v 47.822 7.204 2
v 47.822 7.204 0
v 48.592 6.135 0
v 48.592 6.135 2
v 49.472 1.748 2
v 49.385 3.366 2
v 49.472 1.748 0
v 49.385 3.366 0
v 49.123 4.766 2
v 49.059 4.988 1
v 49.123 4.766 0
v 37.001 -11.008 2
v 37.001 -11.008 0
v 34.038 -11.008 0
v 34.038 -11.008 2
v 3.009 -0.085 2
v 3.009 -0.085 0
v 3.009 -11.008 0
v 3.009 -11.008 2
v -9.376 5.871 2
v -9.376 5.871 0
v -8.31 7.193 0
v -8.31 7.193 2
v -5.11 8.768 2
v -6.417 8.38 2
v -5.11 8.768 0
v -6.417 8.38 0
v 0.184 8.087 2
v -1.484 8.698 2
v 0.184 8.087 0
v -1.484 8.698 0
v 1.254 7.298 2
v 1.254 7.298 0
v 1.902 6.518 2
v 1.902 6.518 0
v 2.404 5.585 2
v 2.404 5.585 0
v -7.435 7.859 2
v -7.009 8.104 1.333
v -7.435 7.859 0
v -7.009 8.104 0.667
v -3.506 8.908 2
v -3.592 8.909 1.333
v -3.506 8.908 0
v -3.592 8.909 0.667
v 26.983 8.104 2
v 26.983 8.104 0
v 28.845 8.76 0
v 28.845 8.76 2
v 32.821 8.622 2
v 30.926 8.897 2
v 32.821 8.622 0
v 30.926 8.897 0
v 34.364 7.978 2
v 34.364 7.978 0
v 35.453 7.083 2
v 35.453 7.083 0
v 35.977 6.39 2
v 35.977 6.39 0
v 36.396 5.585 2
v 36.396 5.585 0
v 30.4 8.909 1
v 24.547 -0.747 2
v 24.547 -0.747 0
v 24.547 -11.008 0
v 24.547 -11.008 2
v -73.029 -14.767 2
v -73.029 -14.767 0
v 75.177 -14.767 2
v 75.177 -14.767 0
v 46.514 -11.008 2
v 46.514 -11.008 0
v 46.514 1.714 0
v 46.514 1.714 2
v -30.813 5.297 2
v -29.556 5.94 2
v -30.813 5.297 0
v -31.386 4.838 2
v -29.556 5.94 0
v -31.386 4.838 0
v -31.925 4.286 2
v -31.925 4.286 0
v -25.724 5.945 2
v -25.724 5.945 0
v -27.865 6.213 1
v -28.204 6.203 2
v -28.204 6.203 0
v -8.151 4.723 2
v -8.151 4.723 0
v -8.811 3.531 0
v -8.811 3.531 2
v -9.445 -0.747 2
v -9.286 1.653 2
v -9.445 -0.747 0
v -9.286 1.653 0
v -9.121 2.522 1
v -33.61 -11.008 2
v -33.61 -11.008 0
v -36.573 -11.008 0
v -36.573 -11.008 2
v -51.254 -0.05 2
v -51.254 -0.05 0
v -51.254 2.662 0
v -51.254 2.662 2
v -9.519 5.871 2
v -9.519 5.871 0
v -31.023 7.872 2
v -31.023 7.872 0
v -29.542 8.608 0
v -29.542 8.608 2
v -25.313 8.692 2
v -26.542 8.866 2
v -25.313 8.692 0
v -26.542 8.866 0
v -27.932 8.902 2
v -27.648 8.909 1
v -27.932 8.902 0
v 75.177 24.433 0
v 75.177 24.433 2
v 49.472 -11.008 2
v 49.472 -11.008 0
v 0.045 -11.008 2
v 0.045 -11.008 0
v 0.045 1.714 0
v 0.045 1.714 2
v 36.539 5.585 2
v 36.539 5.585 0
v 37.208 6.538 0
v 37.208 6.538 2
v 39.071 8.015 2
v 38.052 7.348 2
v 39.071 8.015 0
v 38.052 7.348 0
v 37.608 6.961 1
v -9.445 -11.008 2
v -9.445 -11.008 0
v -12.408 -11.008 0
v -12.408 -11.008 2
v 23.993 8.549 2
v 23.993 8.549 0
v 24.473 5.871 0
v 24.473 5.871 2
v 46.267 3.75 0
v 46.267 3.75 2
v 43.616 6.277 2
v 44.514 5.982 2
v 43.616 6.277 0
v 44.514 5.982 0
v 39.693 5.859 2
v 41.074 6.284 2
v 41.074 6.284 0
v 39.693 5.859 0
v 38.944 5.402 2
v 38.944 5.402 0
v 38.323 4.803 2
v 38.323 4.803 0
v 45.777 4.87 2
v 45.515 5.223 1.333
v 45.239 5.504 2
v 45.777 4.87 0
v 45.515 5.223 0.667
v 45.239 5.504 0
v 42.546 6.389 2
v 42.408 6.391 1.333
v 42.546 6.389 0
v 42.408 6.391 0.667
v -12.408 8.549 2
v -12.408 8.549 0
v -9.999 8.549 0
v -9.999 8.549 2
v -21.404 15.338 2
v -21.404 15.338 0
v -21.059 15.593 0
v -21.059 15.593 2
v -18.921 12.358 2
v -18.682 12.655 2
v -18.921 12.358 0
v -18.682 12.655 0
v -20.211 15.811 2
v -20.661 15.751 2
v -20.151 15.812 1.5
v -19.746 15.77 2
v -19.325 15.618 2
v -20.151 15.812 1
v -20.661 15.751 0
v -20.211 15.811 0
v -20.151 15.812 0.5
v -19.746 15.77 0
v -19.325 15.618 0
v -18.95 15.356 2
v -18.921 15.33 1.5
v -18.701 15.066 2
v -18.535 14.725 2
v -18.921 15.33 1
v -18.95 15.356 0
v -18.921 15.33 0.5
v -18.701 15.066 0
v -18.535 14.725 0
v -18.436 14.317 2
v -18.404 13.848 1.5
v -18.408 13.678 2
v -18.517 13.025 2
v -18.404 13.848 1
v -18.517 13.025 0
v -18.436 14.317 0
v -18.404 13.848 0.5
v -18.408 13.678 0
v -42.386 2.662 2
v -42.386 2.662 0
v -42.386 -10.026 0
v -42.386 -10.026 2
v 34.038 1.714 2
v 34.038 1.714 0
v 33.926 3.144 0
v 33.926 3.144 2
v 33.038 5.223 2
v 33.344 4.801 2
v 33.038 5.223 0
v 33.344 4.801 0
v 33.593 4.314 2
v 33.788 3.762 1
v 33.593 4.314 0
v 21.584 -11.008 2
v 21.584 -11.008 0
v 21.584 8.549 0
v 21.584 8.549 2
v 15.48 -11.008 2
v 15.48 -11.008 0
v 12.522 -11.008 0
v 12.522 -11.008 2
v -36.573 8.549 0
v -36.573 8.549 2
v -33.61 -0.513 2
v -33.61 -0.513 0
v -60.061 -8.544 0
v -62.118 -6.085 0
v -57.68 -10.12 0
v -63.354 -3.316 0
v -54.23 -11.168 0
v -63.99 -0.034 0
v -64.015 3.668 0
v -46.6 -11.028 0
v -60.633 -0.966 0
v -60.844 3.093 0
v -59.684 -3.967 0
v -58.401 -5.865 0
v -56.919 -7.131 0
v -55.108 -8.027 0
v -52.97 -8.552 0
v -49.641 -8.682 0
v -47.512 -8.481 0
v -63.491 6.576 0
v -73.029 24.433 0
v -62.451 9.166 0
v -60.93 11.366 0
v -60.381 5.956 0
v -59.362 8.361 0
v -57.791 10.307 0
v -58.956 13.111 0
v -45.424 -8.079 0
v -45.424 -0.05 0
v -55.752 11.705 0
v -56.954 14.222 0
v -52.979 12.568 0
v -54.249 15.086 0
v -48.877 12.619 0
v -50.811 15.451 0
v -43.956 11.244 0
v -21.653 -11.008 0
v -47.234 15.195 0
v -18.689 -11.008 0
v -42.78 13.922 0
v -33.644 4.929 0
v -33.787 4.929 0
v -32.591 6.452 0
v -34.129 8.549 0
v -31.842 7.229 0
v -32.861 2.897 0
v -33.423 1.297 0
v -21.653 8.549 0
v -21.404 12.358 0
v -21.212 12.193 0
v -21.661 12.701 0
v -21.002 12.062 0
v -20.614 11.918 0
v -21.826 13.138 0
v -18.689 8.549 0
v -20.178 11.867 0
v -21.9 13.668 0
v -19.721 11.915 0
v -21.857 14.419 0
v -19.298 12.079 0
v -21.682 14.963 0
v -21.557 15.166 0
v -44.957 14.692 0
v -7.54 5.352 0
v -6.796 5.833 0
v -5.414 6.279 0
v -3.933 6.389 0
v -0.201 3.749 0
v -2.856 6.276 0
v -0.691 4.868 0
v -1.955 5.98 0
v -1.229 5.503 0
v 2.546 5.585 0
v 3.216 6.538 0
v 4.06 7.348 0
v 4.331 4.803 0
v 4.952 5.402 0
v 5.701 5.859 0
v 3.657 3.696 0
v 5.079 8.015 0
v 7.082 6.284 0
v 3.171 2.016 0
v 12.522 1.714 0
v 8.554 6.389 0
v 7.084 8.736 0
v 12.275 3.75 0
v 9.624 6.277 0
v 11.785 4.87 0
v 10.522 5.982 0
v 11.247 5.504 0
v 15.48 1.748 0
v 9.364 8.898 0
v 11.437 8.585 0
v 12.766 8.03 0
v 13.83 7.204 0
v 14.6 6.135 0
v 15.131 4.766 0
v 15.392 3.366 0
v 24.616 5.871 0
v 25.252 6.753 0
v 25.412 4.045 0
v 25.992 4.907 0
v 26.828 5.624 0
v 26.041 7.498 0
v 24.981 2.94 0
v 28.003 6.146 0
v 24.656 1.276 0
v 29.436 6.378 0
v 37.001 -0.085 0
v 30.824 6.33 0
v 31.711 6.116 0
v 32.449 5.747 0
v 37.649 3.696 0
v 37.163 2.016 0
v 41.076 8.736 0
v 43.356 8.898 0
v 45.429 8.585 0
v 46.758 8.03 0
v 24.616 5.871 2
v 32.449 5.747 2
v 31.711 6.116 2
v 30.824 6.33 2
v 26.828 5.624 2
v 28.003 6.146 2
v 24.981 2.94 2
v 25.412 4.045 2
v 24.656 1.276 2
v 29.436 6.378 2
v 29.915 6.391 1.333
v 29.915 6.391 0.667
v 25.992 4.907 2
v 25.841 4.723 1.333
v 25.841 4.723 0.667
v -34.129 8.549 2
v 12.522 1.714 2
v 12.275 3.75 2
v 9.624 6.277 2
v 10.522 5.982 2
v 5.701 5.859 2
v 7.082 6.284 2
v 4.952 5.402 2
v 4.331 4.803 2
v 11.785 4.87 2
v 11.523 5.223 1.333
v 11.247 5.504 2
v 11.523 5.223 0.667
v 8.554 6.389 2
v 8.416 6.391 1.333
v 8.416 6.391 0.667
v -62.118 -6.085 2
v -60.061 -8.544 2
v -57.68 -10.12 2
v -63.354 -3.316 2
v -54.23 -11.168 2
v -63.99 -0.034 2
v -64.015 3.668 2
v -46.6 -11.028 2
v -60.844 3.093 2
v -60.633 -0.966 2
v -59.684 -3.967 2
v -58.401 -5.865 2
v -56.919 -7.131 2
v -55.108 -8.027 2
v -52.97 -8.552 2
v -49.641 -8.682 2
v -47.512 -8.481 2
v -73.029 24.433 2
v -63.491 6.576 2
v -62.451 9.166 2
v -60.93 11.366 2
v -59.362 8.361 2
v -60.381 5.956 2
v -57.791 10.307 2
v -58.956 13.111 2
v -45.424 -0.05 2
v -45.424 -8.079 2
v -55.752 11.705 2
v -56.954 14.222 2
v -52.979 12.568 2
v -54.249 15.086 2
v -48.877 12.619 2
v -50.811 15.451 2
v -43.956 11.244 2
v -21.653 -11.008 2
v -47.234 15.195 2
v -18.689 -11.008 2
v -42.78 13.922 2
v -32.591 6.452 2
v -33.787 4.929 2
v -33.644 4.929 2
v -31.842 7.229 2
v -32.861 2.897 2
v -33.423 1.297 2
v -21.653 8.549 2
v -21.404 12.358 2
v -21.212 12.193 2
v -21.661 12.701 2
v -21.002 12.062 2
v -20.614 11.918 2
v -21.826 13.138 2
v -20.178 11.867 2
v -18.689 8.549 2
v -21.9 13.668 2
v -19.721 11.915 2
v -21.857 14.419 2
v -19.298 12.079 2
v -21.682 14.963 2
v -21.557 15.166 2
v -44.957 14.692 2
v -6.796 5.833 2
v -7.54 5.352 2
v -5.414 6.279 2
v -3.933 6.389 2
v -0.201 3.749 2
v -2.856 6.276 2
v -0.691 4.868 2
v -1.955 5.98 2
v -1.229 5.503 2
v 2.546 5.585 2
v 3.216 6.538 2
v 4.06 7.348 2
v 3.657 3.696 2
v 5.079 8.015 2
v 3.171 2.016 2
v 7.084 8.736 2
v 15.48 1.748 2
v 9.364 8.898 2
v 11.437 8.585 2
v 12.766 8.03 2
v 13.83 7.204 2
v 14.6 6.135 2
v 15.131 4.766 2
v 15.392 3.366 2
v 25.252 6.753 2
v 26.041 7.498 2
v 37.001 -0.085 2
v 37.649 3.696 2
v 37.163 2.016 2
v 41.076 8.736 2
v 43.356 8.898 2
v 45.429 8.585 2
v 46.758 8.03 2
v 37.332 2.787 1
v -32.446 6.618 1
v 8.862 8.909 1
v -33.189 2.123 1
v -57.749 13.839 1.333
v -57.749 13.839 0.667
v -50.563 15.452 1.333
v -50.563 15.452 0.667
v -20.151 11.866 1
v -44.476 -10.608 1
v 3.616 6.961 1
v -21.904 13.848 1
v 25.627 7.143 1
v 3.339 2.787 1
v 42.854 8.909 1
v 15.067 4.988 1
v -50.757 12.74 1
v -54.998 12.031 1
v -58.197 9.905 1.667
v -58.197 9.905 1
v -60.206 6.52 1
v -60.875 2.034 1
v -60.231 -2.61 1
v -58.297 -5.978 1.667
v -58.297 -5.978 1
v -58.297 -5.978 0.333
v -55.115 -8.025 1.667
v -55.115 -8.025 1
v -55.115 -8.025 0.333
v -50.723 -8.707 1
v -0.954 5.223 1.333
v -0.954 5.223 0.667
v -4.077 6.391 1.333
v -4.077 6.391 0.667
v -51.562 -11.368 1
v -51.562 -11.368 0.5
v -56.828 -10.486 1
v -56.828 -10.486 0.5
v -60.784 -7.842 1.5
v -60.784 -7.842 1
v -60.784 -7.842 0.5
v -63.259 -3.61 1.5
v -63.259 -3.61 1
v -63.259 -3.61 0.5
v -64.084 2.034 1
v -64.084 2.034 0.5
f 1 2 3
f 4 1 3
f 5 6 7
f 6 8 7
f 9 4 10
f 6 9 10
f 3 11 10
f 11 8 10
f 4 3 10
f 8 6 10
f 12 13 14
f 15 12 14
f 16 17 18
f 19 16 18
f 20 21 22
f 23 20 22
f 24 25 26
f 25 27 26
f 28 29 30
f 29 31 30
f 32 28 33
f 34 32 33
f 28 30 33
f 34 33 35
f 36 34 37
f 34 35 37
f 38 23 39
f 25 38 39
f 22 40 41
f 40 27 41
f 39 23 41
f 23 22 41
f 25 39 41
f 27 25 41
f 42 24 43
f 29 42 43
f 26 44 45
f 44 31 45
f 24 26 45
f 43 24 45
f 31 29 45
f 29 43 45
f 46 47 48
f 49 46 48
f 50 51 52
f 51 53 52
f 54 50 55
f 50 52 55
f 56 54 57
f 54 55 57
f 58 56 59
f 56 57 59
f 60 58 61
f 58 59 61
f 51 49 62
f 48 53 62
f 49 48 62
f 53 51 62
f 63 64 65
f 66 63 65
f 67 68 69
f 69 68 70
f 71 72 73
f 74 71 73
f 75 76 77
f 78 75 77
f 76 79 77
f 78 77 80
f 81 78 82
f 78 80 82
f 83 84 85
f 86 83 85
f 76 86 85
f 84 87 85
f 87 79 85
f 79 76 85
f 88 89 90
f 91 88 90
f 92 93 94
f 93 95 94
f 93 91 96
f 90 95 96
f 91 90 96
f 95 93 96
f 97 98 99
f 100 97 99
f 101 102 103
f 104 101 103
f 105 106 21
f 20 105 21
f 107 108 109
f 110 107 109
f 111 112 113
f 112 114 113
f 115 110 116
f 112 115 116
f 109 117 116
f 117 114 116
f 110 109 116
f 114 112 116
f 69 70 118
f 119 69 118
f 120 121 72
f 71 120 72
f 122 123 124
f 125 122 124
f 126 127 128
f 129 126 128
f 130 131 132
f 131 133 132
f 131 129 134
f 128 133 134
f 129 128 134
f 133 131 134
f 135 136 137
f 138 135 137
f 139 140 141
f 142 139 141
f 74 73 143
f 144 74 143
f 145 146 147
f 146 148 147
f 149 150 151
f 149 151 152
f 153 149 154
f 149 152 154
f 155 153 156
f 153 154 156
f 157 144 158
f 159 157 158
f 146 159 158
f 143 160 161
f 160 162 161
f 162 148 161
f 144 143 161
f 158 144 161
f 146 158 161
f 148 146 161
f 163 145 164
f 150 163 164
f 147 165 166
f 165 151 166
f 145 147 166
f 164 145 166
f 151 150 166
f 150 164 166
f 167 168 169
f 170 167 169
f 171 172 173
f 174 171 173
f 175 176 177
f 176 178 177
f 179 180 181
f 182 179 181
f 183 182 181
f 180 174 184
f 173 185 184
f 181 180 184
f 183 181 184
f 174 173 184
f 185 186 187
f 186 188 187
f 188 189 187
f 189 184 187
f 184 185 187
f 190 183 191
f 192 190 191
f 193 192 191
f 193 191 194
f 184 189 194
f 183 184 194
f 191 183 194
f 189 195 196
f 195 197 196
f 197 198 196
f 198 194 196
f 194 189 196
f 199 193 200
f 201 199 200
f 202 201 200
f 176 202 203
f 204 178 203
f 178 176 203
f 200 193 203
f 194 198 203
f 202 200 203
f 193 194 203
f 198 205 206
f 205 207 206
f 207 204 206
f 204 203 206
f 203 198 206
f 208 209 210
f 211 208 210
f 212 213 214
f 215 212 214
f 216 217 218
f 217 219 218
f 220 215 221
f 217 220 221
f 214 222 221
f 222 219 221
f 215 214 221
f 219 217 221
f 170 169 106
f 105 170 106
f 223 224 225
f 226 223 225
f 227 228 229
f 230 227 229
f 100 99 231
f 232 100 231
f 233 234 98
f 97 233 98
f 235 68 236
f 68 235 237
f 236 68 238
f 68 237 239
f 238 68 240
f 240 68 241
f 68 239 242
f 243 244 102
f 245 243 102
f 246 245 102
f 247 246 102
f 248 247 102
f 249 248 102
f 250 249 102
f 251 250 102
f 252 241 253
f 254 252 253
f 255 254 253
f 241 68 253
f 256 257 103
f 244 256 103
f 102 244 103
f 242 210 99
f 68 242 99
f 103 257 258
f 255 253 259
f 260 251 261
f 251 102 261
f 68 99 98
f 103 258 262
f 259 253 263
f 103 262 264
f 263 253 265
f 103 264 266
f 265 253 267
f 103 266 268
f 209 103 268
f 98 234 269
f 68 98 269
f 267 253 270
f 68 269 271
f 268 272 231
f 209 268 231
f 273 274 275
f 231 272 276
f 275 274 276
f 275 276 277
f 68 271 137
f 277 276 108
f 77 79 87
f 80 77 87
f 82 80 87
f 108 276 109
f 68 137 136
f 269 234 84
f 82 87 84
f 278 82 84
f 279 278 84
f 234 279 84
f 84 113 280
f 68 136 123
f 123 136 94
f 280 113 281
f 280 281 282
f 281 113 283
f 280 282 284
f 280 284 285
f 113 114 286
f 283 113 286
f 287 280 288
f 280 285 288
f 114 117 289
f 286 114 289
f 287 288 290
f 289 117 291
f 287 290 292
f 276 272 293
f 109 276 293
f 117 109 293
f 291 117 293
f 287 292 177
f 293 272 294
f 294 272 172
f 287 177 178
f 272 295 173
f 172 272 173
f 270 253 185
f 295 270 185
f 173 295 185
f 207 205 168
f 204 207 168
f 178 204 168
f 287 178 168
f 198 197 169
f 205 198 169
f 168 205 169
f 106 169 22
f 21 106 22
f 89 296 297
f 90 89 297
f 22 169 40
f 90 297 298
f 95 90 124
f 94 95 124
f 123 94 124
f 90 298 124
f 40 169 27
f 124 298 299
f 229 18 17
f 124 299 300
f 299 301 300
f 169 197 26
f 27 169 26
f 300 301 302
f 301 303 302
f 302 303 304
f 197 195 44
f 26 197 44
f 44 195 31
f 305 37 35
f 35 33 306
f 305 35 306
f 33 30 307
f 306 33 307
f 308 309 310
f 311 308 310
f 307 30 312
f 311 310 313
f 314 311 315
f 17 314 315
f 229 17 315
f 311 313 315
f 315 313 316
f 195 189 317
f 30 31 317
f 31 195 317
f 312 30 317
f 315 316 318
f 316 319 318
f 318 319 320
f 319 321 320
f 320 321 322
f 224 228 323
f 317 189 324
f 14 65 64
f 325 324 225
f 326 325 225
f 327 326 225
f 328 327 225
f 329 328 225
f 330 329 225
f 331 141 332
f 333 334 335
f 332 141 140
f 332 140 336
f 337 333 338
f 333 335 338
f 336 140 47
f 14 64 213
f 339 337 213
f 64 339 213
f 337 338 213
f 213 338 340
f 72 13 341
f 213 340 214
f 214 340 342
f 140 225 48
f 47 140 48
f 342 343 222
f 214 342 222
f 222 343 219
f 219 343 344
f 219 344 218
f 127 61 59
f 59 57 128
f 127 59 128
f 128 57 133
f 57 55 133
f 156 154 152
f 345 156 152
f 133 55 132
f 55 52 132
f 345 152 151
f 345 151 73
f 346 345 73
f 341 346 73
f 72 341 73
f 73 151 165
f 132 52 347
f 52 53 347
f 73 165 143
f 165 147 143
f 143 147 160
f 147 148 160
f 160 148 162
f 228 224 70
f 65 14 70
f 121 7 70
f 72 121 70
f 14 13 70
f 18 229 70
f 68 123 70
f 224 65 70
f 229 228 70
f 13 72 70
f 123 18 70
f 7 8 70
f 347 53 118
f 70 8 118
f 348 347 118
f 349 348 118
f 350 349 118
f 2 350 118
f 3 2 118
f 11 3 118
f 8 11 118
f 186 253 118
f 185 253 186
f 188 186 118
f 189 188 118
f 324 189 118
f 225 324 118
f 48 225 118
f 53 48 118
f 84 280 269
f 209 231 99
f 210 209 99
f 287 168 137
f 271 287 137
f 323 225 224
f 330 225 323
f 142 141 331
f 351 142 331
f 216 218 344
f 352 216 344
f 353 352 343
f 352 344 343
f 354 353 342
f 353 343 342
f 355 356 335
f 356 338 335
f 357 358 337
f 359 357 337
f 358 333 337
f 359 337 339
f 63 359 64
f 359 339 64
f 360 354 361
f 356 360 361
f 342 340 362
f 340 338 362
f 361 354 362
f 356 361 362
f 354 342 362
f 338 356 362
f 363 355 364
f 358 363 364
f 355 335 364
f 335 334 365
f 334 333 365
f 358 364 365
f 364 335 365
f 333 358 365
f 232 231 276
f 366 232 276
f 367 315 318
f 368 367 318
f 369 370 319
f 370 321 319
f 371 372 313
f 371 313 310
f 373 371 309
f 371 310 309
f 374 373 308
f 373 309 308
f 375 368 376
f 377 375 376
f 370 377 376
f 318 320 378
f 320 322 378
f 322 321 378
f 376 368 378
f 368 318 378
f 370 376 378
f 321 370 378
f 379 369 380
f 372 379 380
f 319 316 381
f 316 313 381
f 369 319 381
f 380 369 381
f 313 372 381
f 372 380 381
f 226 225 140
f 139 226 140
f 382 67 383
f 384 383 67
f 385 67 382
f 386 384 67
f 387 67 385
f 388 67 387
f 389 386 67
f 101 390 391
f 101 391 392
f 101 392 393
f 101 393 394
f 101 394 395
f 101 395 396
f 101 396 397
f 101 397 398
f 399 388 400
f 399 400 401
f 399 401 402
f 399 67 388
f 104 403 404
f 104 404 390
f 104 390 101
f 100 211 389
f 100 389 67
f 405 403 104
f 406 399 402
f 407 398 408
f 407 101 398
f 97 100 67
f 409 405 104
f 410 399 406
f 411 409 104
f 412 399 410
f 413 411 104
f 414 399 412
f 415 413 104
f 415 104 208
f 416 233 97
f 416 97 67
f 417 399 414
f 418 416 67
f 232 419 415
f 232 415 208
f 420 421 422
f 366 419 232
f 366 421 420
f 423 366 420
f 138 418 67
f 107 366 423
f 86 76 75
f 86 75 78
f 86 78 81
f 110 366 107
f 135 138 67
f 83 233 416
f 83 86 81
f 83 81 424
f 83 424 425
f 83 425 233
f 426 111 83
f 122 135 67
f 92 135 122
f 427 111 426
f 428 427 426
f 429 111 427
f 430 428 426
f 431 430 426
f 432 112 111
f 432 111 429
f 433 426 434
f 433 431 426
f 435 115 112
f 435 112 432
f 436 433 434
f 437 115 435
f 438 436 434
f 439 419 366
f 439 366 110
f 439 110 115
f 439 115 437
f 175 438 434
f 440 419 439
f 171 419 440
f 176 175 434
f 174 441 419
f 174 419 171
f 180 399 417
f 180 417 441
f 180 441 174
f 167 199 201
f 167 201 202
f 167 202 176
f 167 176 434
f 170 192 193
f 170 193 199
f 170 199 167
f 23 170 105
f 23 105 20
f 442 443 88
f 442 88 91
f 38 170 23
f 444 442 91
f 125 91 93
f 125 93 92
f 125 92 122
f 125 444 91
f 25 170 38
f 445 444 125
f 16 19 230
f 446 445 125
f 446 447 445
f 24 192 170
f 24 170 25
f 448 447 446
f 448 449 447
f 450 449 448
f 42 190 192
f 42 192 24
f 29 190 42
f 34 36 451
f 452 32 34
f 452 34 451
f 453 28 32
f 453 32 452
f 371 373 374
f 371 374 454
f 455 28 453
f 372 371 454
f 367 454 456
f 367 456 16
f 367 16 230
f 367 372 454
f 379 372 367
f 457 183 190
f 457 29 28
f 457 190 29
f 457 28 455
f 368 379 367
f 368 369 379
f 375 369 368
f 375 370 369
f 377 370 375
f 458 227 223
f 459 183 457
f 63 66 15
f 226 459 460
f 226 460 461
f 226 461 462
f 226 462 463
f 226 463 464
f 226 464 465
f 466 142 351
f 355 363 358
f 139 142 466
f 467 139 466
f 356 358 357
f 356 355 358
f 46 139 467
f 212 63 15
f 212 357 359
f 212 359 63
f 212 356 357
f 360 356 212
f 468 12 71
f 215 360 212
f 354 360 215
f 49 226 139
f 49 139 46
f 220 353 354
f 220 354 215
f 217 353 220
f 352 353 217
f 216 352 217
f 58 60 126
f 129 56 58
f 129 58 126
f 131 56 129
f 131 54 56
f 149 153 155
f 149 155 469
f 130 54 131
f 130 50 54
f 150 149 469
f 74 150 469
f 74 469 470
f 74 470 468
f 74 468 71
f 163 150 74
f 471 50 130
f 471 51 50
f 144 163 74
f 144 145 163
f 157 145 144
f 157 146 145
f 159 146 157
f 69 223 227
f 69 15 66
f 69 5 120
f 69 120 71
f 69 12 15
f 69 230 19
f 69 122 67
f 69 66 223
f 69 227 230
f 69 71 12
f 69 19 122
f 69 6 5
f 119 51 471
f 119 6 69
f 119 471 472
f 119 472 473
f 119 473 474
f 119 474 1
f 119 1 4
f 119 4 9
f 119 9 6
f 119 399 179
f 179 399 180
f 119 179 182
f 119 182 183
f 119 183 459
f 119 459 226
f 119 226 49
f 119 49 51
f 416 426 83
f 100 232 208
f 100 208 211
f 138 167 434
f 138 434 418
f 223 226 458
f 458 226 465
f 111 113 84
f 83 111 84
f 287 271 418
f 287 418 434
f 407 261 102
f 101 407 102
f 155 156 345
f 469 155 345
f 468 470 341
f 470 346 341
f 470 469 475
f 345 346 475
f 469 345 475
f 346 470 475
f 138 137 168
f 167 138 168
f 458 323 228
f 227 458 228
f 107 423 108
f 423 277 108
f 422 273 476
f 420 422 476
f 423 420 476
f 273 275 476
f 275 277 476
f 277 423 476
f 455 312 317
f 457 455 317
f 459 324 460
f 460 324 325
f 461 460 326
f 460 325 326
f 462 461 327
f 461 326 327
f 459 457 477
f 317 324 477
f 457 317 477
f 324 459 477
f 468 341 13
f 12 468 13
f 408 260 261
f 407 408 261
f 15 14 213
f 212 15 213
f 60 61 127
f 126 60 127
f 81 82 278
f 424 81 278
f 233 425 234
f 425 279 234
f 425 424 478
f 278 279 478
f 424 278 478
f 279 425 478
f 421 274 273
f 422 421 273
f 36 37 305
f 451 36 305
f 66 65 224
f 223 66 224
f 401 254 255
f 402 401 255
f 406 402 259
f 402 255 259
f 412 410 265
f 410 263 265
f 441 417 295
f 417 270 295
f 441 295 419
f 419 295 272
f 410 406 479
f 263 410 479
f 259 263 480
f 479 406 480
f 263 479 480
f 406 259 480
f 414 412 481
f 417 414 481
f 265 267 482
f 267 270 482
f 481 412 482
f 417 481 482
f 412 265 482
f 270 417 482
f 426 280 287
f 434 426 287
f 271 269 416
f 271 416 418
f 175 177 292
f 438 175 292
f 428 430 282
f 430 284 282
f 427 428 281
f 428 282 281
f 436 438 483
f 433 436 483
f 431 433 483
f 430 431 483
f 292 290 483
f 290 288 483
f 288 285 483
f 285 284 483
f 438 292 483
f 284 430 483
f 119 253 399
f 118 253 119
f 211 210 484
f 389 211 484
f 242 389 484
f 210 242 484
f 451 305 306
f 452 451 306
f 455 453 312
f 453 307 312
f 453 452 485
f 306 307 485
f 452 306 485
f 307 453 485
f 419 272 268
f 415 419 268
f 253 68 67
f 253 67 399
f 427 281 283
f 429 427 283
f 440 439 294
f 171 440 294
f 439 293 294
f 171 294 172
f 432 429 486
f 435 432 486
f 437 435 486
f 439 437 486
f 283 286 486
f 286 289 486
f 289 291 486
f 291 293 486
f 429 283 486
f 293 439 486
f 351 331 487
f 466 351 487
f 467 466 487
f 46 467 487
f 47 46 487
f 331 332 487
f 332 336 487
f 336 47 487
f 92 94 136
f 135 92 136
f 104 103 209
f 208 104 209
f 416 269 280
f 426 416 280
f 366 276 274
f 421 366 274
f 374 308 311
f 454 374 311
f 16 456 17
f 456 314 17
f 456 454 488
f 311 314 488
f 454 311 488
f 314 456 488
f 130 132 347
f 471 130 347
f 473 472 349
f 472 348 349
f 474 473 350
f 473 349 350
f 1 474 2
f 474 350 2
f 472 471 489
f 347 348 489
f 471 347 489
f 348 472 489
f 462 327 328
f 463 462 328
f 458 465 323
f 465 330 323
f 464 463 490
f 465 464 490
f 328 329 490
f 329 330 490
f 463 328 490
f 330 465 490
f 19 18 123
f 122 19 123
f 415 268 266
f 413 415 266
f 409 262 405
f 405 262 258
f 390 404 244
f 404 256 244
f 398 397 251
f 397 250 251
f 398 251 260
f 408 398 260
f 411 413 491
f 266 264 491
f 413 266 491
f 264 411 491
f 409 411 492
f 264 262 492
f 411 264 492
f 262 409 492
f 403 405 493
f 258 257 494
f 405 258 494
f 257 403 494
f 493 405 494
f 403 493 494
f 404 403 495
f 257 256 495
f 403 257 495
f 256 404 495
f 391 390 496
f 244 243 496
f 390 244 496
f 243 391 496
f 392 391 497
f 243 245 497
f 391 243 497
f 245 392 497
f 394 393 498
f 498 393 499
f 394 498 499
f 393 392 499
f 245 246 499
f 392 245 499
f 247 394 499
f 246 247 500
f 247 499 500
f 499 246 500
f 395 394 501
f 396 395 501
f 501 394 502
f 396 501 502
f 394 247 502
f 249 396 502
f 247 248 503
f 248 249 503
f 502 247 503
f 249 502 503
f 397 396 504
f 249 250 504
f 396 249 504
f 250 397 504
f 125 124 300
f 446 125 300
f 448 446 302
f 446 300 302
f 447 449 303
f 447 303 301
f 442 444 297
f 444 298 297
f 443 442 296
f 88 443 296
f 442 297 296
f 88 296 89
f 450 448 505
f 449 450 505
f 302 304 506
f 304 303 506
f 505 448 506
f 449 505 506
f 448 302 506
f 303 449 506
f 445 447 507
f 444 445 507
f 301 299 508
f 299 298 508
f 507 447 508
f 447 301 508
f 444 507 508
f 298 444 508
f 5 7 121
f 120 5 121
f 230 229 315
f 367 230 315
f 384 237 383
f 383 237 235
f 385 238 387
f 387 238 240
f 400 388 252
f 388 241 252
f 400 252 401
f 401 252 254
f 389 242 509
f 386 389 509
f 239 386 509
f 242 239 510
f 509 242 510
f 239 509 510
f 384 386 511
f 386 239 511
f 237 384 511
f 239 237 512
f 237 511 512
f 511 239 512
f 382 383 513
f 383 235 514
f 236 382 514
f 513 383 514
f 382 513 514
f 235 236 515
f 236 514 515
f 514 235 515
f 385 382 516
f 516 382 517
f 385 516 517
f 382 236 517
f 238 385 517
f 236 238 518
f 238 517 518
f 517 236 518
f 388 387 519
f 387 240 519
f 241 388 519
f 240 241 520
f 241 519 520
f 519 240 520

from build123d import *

# Parameters (mm, degrees)
F0_W     = 148.2064500451
F0_H     = 39.1995310783
F0_W_2   = 2.9635276284
F0_H_2   = 19.5569983185
F1_DEPTH = 2


with BuildPart() as f1:
    # F0 (on Top) → F1 (new body)
    with BuildSketch(Plane.XY):
        with Locations((1.0739602149, 4.8328191042)):
            Rectangle(F0_W, F0_H)
        with BuildLine():
            Line((-51.2538431366, -0.0504584148), (-51.2538431366, 2.6618260235))
            Line((-51.2538431366, 2.6618260235), (-42.3861005414, 2.6618260235))
            Line((-42.3861005414, 2.6618260235), (-42.3861005414, -10.0259550753))
            add(Edge.make_bspline(
                [(-42.3861005414, -10.0259550753), (-44.4588568595, -10.6883234855), (-46.6001340477, -11.0280727994)],
                knots=[0, 0, 0, 1, 1, 1], degree=2))
            add(Edge.make_bspline(
                [(-46.6001340477, -11.0280727994), (-48.7414112358, -11.3678221132), (-51.5621870517, -11.3678221132)],
                knots=[0, 0, 0, 1, 1, 1], degree=2))
            add(Edge.make_bspline(
                [(-51.5621870517, -11.3678221132), (-57.483532236, -11.3678221132), (-60.783954142, -7.8418523434)],
                knots=[0, 0, 0, 1, 1, 1], degree=2))
            add(Edge.make_bspline(
                [(-60.783954142, -7.8418523434), (-64.084376048, -4.3158825736), (-64.084376048, 2.0337180483)],
                knots=[0, 0, 0, 1, 1, 1], degree=2))
            add(Edge.make_bspline(
                [(-64.084376048, 2.0337180483), (-64.084376048, 6.1049997421), (-62.4512953125, 9.165598603)],
                knots=[0, 0, 0, 1, 1, 1], degree=2))
            add(Edge.make_bspline(
                [(-62.4512953125, 9.165598603), (-60.818214577, 12.226197464), (-57.7490506073, 13.8392929457)],
                knots=[0, 0, 0, 1, 1, 1], degree=2))
            add(Edge.make_bspline(
                [(-57.7490506073, 13.8392929457), (-54.6798866376, 15.4523884274), (-50.5629243639, 15.4523884274)],
                knots=[0, 0, 0, 1, 1, 1], degree=2))
            add(Edge.make_bspline(
                [(-50.5629243639, 15.4523884274), (-46.3831512926, 15.4523884274), (-42.780095544, 13.922088997)],
                knots=[0, 0, 0, 1, 1, 1], degree=2))
            Line((-42.780095544, 13.922088997), (-43.9563704794, 11.2440649937))
            add(Edge.make_bspline(
                [(-43.9563704794, 11.2440649937), (-47.4909053579, 12.7401039891), (-50.7570668289, 12.7401039891)],
                knots=[0, 0, 0, 1, 1, 1], degree=2))
            add(Edge.make_bspline(
                [(-50.7570668289, 12.7401039891), (-55.5192672954, 12.7401039891), (-58.1972912987, 9.905052992)],
                knots=[0, 0, 0, 1, 1, 1], degree=2))
            add(Edge.make_bspline(
                [(-58.1972912987, 9.905052992), (-60.875315302, 7.0700019949), (-60.875315302, 2.0337180483)],
                knots=[0, 0, 0, 1, 1, 1], degree=2))
            add(Edge.make_bspline(
                [(-60.875315302, 2.0337180483), (-60.875315302, -3.2480990158), (-58.2972175675, -5.9775136716)],
                knots=[0, 0, 0, 1, 1, 1], degree=2))
            add(Edge.make_bspline(
                [(-58.2972175675, -5.9775136716), (-55.719119833, -8.7069283274), (-50.7228063939, -8.7069283274)],
                knots=[0, 0, 0, 1, 1, 1], degree=2))
            add(Edge.make_bspline(
                [(-50.7228063939, -8.7069283274), (-48.0105219556, -8.7069283274), (-45.4238591123, -8.0788203522)],
                knots=[0, 0, 0, 1, 1, 1], degree=2))
            Line((-45.4238591123, -8.0788203522), (-45.4238591123, -0.0504584148))
            Line((-45.4238591123, -0.0504584148), (-51.2538431366, -0.0504584148))
        make_face(mode=Mode.SUBTRACT)
        with BuildLine():
            add(Edge.make_bspline(
                [(-31.0230562629, 7.8722671814), (-29.4870467599, 8.9086453404), (-27.6484034144, 8.9086453404)],
                knots=[0, 0, 0, 1, 1, 1], degree=2))
            add(Edge.make_bspline(
                [(-27.6484034144, 8.9086453404), (-26.346506884, 8.9086453404), (-25.3129837612, 8.6916625854)],
                knots=[0, 0, 0, 1, 1, 1], degree=2))
            Line((-25.3129837612, 8.6916625854), (-25.7241089813, 5.945117712))
            add(Edge.make_bspline(
                [(-25.7241089813, 5.945117712), (-26.9346443517, 6.2134911196), (-27.8653861694, 6.2134911196)],
                knots=[0, 0, 0, 1, 1, 1], degree=2))
            add(Edge.make_bspline(
                [(-27.8653861694, 6.2134911196), (-30.2407763302, 6.2134911196), (-31.9252477182, 4.2863416503)],
                knots=[0, 0, 0, 1, 1, 1], degree=2))
            add(Edge.make_bspline(
                [(-31.9252477182, 4.2863416503), (-33.6097191062, 2.3591921809), (-33.6097191062, -0.5129742874)],
                knots=[0, 0, 0, 1, 1, 1], degree=2))
            Line((-33.6097191062, -0.5129742874), (-33.6097191062, -11.0080875456))
            Line((-33.6097191062, -11.0080875456), (-36.5732467346, -11.0080875456))
            Line((-36.5732467346, -11.0080875456), (-36.5732467346, 8.5489107728))
            Line((-36.5732467346, 8.5489107728), (-34.1293357039, 8.5489107728))
            Line((-34.1293357039, 8.5489107728), (-33.7867313538, 4.9287248067))
            Line((-33.7867313538, 4.9287248067), (-33.6439795412, 4.9287248067))
            add(Edge.make_bspline(
                [(-33.6439795412, 4.9287248067), (-32.5590657659, 6.8358890223), (-31.0230562629, 7.8722671814)],
                knots=[0, 0, 0, 1, 1, 1], degree=2))
        make_face(mode=Mode.SUBTRACT)
        with Locations((-20.1710634733, -1.2295883864)):
            Rectangle(F0_W_2, F0_H_2, mode=Mode.SUBTRACT)
        with BuildLine():
            Line((15.4797741913, -11.0080875456), (12.5219566354, -11.0080875456))
            Line((12.5219566354, -11.0080875456), (12.5219566354, 1.7139539883))
            add(Edge.make_bspline(
                [(12.5219566354, 1.7139539883), (12.5219566354, 4.055083714), (11.5226939476, 5.2227935406)],
                knots=[0, 0, 0, 1, 1, 1], degree=2))
            add(Edge.make_bspline(
                [(11.5226939476, 5.2227935406), (10.5234312598, 6.3905033672), (8.4164145066, 6.3905033672)],
                knots=[0, 0, 0, 1, 1, 1], degree=2))
            add(Edge.make_bspline(
                [(8.4164145066, 6.3905033672), (5.6527394158, 6.3905033672), (4.3308576316, 4.8031032117)],
                knots=[0, 0, 0, 1, 1, 1], degree=2))
            add(Edge.make_bspline(
                [(4.3308576316, 4.8031032117), (3.0089758475, 3.2157030562), (3.0089758475, -0.0847188498)],
                knots=[0, 0, 0, 1, 1, 1], degree=2))
            Line((3.0089758475, -0.0847188498), (3.0089758475, -11.0080875456))
            Line((3.0089758475, -11.0080875456), (0.0454482191, -11.0080875456))
            Line((0.0454482191, -11.0080875456), (0.0454482191, 1.7139539883))
            add(Edge.make_bspline(
                [(0.0454482191, 1.7139539883), (0.0454482191, 4.055083714), (-0.9538144687, 5.2227935406)],
                knots=[0, 0, 0, 1, 1, 1], degree=2))
            add(Edge.make_bspline(
                [(-0.9538144687, 5.2227935406), (-1.9530771565, 6.3905033672), (-4.0772241272, 6.3905033672)],
                knots=[0, 0, 0, 1, 1, 1], degree=2))
            add(Edge.make_bspline(
                [(-4.0772241272, 6.3905033672), (-6.8580294355, 6.3905033672), (-8.1513608572, 4.7231621967)],
                knots=[0, 0, 0, 1, 1, 1], degree=2))
            add(Edge.make_bspline(
                [(-8.1513608572, 4.7231621967), (-9.4446922788, 3.0558210262), (-9.4446922788, -0.74708726)],
                knots=[0, 0, 0, 1, 1, 1], degree=2))
            Line((-9.4446922788, -0.74708726), (-9.4446922788, -11.0080875456))
            Line((-9.4446922788, -11.0080875456), (-12.4082199072, -11.0080875456))
            Line((-12.4082199072, -11.0080875456), (-12.4082199072, 8.5489107728))
            Line((-12.4082199072, 8.5489107728), (-9.9985693115, 8.5489107728))
            Line((-9.9985693115, 8.5489107728), (-9.5189232213, 5.8708867695))
            Line((-9.5189232213, 5.8708867695), (-9.3761714088, 5.8708867695))
            add(Edge.make_bspline(
                [(-9.3761714088, 5.8708867695), (-8.536790751, 7.298404895), (-7.0093463568, 8.1035251177)],
                knots=[0, 0, 0, 1, 1, 1], degree=2))
            add(Edge.make_bspline(
                [(-7.0093463568, 8.1035251177), (-5.4819019626, 8.9086453404), (-3.5918679645, 8.9086453404)],
                knots=[0, 0, 0, 1, 1, 1], degree=2))
            add(Edge.make_bspline(
                [(-3.5918679645, 8.9086453404), (0.9933202544, 8.9086453404), (2.4037081623, 5.5853831444)],
                knots=[0, 0, 0, 1, 1, 1], degree=2))
            Line((2.4037081623, 5.5853831444), (2.5464599748, 5.5853831444))
            add(Edge.make_bspline(
                [(2.5464599748, 5.5853831444), (3.4201010676, 7.1213926474), (5.0788771294, 8.0150189939)],
                knots=[0, 0, 0, 1, 1, 1], degree=2))
            add(Edge.make_bspline(
                [(5.0788771294, 8.0150189939), (6.7376531911, 8.9086453404), (8.8618001618, 8.9086453404)],
                knots=[0, 0, 0, 1, 1, 1], degree=2))
            add(Edge.make_bspline(
                [(8.8618001618, 8.9086453404), (12.1793522853, 8.9086453404), (13.8295632383, 7.2041886987)],
                knots=[0, 0, 0, 1, 1, 1], degree=2))
            add(Edge.make_bspline(
                [(13.8295632383, 7.2041886987), (15.4797741913, 5.4997320569), (15.4797741913, 1.7482144233)],
                knots=[0, 0, 0, 1, 1, 1], degree=2))
            Line((15.4797741913, 1.7482144233), (15.4797741913, -11.0080875456))
        make_face(mode=Mode.SUBTRACT)
        with BuildLine():
            Line((49.4718357942, -11.0080875456), (46.5140182383, -11.0080875456))
            Line((46.5140182383, -11.0080875456), (46.5140182383, 1.7139539883))
            add(Edge.make_bspline(
                [(46.5140182383, 1.7139539883), (46.5140182383, 4.055083714), (45.5147555505, 5.2227935406)],
                knots=[0, 0, 0, 1, 1, 1], degree=2))
            add(Edge.make_bspline(
                [(45.5147555505, 5.2227935406), (44.5154928627, 6.3905033672), (42.4084761095, 6.3905033672)],
                knots=[0, 0, 0, 1, 1, 1], degree=2))
            add(Edge.make_bspline(
                [(42.4084761095, 6.3905033672), (39.6448010187, 6.3905033672), (38.3229192345, 4.8031032117)],
                knots=[0, 0, 0, 1, 1, 1], degree=2))
            add(Edge.make_bspline(
                [(38.3229192345, 4.8031032117), (37.0010374504, 3.2157030562), (37.0010374504, -0.0847188498)],
                knots=[0, 0, 0, 1, 1, 1], degree=2))
            Line((37.0010374504, -0.0847188498), (37.0010374504, -11.0080875456))
            Line((37.0010374504, -11.0080875456), (34.037509822, -11.0080875456))
            Line((34.037509822, -11.0080875456), (34.037509822, 1.7139539883))
            add(Edge.make_bspline(
                [(34.037509822, 1.7139539883), (34.037509822, 4.055083714), (33.0382471341, 5.2227935406)],
                knots=[0, 0, 0, 1, 1, 1], degree=2))
            add(Edge.make_bspline(
                [(33.0382471341, 5.2227935406), (32.0389844463, 6.3905033672), (29.9148374757, 6.3905033672)],
                knots=[0, 0, 0, 1, 1, 1], degree=2))
            add(Edge.make_bspline(
                [(29.9148374757, 6.3905033672), (27.1340321673, 6.3905033672), (25.8407007457, 4.7231621967)],
                knots=[0, 0, 0, 1, 1, 1], degree=2))
            add(Edge.make_bspline(
                [(25.8407007457, 4.7231621967), (24.5473693241, 3.0558210262), (24.5473693241, -0.74708726)],
                knots=[0, 0, 0, 1, 1, 1], degree=2))
            Line((24.5473693241, -0.74708726), (24.5473693241, -11.0080875456))
            Line((24.5473693241, -11.0080875456), (21.5838416957, -11.0080875456))
            Line((21.5838416957, -11.0080875456), (21.5838416957, 8.5489107728))
            Line((21.5838416957, 8.5489107728), (23.9934922914, 8.5489107728))
            Line((23.9934922914, 8.5489107728), (24.4731383815, 5.8708867695))
            Line((24.4731383815, 5.8708867695), (24.6158901941, 5.8708867695))
            add(Edge.make_bspline(
                [(24.6158901941, 5.8708867695), (25.4552708518, 7.298404895), (26.982715246, 8.1035251177)],
                knots=[0, 0, 0, 1, 1, 1], degree=2))
            add(Edge.make_bspline(
                [(26.982715246, 8.1035251177), (28.5101596403, 8.9086453404), (30.4001936383, 8.9086453404)],
                knots=[0, 0, 0, 1, 1, 1], degree=2))
            add(Edge.make_bspline(
                [(30.4001936383, 8.9086453404), (34.9853818572, 8.9086453404), (36.3957697652, 5.5853831444)],
                knots=[0, 0, 0, 1, 1, 1], degree=2))
            Line((36.3957697652, 5.5853831444), (36.5385215777, 5.5853831444))
            add(Edge.make_bspline(
                [(36.5385215777, 5.5853831444), (37.4121626705, 7.1213926474), (39.0709387322, 8.0150189939)],
                knots=[0, 0, 0, 1, 1, 1], degree=2))
            add(Edge.make_bspline(
                [(39.0709387322, 8.0150189939), (40.729714794, 8.9086453404), (42.8538617646, 8.9086453404)],
                knots=[0, 0, 0, 1, 1, 1], degree=2))
            add(Edge.make_bspline(
                [(42.8538617646, 8.9086453404), (46.1714138882, 8.9086453404), (47.8216248412, 7.2041886987)],
                knots=[0, 0, 0, 1, 1, 1], degree=2))
            add(Edge.make_bspline(
                [(47.8216248412, 7.2041886987), (49.4718357942, 5.4997320569), (49.4718357942, 1.7482144233)],
                knots=[0, 0, 0, 1, 1, 1], degree=2))
            Line((49.4718357942, 1.7482144233), (49.4718357942, -11.0080875456))
        make_face(mode=Mode.SUBTRACT)
        with BuildLine():
            add(Edge.make_bspline(
                [(-21.4044391337, 12.3575291315), (-21.9040704776, 12.8485953667), (-21.9040704776, 13.8478580545)],
                knots=[0, 0, 0, 1, 1, 1], degree=2))
            add(Edge.make_bspline(
                [(-21.9040704776, 13.8478580545), (-21.9040704776, 14.8642509598), (-21.4044391337, 15.3381869774)],
                knots=[0, 0, 0, 1, 1, 1], degree=2))
            add(Edge.make_bspline(
                [(-21.4044391337, 15.3381869774), (-20.9048077898, 15.8121229951), (-20.1510782196, 15.8121229951)],
                knots=[0, 0, 0, 1, 1, 1], degree=2))
            add(Edge.make_bspline(
                [(-20.1510782196, 15.8121229951), (-19.4373191569, 15.8121229951), (-18.9205575955, 15.3296218687)],
                knots=[0, 0, 0, 1, 1, 1], degree=2))
            add(Edge.make_bspline(
                [(-18.9205575955, 15.3296218687), (-18.4037960341, 14.8471207423), (-18.4037960341, 13.8478580545)],
                knots=[0, 0, 0, 1, 1, 1], degree=2))
            add(Edge.make_bspline(
                [(-18.4037960341, 13.8478580545), (-18.4037960341, 12.8485953667), (-18.9205575955, 12.3575291315)],
                knots=[0, 0, 0, 1, 1, 1], degree=2))
            add(Edge.make_bspline(
                [(-18.9205575955, 12.3575291315), (-19.4373191569, 11.8664628964), (-20.1510782196, 11.8664628964)],
                knots=[0, 0, 0, 1, 1, 1], degree=2))
            add(Edge.make_bspline(
                [(-20.1510782196, 11.8664628964), (-20.9048077898, 11.8664628964), (-21.4044391337, 12.3575291315)],
                knots=[0, 0, 0, 1, 1, 1], degree=2))
        make_face(mode=Mode.SUBTRACT)
    extrude(amount=F1_DEPTH)


solid = f1.part
